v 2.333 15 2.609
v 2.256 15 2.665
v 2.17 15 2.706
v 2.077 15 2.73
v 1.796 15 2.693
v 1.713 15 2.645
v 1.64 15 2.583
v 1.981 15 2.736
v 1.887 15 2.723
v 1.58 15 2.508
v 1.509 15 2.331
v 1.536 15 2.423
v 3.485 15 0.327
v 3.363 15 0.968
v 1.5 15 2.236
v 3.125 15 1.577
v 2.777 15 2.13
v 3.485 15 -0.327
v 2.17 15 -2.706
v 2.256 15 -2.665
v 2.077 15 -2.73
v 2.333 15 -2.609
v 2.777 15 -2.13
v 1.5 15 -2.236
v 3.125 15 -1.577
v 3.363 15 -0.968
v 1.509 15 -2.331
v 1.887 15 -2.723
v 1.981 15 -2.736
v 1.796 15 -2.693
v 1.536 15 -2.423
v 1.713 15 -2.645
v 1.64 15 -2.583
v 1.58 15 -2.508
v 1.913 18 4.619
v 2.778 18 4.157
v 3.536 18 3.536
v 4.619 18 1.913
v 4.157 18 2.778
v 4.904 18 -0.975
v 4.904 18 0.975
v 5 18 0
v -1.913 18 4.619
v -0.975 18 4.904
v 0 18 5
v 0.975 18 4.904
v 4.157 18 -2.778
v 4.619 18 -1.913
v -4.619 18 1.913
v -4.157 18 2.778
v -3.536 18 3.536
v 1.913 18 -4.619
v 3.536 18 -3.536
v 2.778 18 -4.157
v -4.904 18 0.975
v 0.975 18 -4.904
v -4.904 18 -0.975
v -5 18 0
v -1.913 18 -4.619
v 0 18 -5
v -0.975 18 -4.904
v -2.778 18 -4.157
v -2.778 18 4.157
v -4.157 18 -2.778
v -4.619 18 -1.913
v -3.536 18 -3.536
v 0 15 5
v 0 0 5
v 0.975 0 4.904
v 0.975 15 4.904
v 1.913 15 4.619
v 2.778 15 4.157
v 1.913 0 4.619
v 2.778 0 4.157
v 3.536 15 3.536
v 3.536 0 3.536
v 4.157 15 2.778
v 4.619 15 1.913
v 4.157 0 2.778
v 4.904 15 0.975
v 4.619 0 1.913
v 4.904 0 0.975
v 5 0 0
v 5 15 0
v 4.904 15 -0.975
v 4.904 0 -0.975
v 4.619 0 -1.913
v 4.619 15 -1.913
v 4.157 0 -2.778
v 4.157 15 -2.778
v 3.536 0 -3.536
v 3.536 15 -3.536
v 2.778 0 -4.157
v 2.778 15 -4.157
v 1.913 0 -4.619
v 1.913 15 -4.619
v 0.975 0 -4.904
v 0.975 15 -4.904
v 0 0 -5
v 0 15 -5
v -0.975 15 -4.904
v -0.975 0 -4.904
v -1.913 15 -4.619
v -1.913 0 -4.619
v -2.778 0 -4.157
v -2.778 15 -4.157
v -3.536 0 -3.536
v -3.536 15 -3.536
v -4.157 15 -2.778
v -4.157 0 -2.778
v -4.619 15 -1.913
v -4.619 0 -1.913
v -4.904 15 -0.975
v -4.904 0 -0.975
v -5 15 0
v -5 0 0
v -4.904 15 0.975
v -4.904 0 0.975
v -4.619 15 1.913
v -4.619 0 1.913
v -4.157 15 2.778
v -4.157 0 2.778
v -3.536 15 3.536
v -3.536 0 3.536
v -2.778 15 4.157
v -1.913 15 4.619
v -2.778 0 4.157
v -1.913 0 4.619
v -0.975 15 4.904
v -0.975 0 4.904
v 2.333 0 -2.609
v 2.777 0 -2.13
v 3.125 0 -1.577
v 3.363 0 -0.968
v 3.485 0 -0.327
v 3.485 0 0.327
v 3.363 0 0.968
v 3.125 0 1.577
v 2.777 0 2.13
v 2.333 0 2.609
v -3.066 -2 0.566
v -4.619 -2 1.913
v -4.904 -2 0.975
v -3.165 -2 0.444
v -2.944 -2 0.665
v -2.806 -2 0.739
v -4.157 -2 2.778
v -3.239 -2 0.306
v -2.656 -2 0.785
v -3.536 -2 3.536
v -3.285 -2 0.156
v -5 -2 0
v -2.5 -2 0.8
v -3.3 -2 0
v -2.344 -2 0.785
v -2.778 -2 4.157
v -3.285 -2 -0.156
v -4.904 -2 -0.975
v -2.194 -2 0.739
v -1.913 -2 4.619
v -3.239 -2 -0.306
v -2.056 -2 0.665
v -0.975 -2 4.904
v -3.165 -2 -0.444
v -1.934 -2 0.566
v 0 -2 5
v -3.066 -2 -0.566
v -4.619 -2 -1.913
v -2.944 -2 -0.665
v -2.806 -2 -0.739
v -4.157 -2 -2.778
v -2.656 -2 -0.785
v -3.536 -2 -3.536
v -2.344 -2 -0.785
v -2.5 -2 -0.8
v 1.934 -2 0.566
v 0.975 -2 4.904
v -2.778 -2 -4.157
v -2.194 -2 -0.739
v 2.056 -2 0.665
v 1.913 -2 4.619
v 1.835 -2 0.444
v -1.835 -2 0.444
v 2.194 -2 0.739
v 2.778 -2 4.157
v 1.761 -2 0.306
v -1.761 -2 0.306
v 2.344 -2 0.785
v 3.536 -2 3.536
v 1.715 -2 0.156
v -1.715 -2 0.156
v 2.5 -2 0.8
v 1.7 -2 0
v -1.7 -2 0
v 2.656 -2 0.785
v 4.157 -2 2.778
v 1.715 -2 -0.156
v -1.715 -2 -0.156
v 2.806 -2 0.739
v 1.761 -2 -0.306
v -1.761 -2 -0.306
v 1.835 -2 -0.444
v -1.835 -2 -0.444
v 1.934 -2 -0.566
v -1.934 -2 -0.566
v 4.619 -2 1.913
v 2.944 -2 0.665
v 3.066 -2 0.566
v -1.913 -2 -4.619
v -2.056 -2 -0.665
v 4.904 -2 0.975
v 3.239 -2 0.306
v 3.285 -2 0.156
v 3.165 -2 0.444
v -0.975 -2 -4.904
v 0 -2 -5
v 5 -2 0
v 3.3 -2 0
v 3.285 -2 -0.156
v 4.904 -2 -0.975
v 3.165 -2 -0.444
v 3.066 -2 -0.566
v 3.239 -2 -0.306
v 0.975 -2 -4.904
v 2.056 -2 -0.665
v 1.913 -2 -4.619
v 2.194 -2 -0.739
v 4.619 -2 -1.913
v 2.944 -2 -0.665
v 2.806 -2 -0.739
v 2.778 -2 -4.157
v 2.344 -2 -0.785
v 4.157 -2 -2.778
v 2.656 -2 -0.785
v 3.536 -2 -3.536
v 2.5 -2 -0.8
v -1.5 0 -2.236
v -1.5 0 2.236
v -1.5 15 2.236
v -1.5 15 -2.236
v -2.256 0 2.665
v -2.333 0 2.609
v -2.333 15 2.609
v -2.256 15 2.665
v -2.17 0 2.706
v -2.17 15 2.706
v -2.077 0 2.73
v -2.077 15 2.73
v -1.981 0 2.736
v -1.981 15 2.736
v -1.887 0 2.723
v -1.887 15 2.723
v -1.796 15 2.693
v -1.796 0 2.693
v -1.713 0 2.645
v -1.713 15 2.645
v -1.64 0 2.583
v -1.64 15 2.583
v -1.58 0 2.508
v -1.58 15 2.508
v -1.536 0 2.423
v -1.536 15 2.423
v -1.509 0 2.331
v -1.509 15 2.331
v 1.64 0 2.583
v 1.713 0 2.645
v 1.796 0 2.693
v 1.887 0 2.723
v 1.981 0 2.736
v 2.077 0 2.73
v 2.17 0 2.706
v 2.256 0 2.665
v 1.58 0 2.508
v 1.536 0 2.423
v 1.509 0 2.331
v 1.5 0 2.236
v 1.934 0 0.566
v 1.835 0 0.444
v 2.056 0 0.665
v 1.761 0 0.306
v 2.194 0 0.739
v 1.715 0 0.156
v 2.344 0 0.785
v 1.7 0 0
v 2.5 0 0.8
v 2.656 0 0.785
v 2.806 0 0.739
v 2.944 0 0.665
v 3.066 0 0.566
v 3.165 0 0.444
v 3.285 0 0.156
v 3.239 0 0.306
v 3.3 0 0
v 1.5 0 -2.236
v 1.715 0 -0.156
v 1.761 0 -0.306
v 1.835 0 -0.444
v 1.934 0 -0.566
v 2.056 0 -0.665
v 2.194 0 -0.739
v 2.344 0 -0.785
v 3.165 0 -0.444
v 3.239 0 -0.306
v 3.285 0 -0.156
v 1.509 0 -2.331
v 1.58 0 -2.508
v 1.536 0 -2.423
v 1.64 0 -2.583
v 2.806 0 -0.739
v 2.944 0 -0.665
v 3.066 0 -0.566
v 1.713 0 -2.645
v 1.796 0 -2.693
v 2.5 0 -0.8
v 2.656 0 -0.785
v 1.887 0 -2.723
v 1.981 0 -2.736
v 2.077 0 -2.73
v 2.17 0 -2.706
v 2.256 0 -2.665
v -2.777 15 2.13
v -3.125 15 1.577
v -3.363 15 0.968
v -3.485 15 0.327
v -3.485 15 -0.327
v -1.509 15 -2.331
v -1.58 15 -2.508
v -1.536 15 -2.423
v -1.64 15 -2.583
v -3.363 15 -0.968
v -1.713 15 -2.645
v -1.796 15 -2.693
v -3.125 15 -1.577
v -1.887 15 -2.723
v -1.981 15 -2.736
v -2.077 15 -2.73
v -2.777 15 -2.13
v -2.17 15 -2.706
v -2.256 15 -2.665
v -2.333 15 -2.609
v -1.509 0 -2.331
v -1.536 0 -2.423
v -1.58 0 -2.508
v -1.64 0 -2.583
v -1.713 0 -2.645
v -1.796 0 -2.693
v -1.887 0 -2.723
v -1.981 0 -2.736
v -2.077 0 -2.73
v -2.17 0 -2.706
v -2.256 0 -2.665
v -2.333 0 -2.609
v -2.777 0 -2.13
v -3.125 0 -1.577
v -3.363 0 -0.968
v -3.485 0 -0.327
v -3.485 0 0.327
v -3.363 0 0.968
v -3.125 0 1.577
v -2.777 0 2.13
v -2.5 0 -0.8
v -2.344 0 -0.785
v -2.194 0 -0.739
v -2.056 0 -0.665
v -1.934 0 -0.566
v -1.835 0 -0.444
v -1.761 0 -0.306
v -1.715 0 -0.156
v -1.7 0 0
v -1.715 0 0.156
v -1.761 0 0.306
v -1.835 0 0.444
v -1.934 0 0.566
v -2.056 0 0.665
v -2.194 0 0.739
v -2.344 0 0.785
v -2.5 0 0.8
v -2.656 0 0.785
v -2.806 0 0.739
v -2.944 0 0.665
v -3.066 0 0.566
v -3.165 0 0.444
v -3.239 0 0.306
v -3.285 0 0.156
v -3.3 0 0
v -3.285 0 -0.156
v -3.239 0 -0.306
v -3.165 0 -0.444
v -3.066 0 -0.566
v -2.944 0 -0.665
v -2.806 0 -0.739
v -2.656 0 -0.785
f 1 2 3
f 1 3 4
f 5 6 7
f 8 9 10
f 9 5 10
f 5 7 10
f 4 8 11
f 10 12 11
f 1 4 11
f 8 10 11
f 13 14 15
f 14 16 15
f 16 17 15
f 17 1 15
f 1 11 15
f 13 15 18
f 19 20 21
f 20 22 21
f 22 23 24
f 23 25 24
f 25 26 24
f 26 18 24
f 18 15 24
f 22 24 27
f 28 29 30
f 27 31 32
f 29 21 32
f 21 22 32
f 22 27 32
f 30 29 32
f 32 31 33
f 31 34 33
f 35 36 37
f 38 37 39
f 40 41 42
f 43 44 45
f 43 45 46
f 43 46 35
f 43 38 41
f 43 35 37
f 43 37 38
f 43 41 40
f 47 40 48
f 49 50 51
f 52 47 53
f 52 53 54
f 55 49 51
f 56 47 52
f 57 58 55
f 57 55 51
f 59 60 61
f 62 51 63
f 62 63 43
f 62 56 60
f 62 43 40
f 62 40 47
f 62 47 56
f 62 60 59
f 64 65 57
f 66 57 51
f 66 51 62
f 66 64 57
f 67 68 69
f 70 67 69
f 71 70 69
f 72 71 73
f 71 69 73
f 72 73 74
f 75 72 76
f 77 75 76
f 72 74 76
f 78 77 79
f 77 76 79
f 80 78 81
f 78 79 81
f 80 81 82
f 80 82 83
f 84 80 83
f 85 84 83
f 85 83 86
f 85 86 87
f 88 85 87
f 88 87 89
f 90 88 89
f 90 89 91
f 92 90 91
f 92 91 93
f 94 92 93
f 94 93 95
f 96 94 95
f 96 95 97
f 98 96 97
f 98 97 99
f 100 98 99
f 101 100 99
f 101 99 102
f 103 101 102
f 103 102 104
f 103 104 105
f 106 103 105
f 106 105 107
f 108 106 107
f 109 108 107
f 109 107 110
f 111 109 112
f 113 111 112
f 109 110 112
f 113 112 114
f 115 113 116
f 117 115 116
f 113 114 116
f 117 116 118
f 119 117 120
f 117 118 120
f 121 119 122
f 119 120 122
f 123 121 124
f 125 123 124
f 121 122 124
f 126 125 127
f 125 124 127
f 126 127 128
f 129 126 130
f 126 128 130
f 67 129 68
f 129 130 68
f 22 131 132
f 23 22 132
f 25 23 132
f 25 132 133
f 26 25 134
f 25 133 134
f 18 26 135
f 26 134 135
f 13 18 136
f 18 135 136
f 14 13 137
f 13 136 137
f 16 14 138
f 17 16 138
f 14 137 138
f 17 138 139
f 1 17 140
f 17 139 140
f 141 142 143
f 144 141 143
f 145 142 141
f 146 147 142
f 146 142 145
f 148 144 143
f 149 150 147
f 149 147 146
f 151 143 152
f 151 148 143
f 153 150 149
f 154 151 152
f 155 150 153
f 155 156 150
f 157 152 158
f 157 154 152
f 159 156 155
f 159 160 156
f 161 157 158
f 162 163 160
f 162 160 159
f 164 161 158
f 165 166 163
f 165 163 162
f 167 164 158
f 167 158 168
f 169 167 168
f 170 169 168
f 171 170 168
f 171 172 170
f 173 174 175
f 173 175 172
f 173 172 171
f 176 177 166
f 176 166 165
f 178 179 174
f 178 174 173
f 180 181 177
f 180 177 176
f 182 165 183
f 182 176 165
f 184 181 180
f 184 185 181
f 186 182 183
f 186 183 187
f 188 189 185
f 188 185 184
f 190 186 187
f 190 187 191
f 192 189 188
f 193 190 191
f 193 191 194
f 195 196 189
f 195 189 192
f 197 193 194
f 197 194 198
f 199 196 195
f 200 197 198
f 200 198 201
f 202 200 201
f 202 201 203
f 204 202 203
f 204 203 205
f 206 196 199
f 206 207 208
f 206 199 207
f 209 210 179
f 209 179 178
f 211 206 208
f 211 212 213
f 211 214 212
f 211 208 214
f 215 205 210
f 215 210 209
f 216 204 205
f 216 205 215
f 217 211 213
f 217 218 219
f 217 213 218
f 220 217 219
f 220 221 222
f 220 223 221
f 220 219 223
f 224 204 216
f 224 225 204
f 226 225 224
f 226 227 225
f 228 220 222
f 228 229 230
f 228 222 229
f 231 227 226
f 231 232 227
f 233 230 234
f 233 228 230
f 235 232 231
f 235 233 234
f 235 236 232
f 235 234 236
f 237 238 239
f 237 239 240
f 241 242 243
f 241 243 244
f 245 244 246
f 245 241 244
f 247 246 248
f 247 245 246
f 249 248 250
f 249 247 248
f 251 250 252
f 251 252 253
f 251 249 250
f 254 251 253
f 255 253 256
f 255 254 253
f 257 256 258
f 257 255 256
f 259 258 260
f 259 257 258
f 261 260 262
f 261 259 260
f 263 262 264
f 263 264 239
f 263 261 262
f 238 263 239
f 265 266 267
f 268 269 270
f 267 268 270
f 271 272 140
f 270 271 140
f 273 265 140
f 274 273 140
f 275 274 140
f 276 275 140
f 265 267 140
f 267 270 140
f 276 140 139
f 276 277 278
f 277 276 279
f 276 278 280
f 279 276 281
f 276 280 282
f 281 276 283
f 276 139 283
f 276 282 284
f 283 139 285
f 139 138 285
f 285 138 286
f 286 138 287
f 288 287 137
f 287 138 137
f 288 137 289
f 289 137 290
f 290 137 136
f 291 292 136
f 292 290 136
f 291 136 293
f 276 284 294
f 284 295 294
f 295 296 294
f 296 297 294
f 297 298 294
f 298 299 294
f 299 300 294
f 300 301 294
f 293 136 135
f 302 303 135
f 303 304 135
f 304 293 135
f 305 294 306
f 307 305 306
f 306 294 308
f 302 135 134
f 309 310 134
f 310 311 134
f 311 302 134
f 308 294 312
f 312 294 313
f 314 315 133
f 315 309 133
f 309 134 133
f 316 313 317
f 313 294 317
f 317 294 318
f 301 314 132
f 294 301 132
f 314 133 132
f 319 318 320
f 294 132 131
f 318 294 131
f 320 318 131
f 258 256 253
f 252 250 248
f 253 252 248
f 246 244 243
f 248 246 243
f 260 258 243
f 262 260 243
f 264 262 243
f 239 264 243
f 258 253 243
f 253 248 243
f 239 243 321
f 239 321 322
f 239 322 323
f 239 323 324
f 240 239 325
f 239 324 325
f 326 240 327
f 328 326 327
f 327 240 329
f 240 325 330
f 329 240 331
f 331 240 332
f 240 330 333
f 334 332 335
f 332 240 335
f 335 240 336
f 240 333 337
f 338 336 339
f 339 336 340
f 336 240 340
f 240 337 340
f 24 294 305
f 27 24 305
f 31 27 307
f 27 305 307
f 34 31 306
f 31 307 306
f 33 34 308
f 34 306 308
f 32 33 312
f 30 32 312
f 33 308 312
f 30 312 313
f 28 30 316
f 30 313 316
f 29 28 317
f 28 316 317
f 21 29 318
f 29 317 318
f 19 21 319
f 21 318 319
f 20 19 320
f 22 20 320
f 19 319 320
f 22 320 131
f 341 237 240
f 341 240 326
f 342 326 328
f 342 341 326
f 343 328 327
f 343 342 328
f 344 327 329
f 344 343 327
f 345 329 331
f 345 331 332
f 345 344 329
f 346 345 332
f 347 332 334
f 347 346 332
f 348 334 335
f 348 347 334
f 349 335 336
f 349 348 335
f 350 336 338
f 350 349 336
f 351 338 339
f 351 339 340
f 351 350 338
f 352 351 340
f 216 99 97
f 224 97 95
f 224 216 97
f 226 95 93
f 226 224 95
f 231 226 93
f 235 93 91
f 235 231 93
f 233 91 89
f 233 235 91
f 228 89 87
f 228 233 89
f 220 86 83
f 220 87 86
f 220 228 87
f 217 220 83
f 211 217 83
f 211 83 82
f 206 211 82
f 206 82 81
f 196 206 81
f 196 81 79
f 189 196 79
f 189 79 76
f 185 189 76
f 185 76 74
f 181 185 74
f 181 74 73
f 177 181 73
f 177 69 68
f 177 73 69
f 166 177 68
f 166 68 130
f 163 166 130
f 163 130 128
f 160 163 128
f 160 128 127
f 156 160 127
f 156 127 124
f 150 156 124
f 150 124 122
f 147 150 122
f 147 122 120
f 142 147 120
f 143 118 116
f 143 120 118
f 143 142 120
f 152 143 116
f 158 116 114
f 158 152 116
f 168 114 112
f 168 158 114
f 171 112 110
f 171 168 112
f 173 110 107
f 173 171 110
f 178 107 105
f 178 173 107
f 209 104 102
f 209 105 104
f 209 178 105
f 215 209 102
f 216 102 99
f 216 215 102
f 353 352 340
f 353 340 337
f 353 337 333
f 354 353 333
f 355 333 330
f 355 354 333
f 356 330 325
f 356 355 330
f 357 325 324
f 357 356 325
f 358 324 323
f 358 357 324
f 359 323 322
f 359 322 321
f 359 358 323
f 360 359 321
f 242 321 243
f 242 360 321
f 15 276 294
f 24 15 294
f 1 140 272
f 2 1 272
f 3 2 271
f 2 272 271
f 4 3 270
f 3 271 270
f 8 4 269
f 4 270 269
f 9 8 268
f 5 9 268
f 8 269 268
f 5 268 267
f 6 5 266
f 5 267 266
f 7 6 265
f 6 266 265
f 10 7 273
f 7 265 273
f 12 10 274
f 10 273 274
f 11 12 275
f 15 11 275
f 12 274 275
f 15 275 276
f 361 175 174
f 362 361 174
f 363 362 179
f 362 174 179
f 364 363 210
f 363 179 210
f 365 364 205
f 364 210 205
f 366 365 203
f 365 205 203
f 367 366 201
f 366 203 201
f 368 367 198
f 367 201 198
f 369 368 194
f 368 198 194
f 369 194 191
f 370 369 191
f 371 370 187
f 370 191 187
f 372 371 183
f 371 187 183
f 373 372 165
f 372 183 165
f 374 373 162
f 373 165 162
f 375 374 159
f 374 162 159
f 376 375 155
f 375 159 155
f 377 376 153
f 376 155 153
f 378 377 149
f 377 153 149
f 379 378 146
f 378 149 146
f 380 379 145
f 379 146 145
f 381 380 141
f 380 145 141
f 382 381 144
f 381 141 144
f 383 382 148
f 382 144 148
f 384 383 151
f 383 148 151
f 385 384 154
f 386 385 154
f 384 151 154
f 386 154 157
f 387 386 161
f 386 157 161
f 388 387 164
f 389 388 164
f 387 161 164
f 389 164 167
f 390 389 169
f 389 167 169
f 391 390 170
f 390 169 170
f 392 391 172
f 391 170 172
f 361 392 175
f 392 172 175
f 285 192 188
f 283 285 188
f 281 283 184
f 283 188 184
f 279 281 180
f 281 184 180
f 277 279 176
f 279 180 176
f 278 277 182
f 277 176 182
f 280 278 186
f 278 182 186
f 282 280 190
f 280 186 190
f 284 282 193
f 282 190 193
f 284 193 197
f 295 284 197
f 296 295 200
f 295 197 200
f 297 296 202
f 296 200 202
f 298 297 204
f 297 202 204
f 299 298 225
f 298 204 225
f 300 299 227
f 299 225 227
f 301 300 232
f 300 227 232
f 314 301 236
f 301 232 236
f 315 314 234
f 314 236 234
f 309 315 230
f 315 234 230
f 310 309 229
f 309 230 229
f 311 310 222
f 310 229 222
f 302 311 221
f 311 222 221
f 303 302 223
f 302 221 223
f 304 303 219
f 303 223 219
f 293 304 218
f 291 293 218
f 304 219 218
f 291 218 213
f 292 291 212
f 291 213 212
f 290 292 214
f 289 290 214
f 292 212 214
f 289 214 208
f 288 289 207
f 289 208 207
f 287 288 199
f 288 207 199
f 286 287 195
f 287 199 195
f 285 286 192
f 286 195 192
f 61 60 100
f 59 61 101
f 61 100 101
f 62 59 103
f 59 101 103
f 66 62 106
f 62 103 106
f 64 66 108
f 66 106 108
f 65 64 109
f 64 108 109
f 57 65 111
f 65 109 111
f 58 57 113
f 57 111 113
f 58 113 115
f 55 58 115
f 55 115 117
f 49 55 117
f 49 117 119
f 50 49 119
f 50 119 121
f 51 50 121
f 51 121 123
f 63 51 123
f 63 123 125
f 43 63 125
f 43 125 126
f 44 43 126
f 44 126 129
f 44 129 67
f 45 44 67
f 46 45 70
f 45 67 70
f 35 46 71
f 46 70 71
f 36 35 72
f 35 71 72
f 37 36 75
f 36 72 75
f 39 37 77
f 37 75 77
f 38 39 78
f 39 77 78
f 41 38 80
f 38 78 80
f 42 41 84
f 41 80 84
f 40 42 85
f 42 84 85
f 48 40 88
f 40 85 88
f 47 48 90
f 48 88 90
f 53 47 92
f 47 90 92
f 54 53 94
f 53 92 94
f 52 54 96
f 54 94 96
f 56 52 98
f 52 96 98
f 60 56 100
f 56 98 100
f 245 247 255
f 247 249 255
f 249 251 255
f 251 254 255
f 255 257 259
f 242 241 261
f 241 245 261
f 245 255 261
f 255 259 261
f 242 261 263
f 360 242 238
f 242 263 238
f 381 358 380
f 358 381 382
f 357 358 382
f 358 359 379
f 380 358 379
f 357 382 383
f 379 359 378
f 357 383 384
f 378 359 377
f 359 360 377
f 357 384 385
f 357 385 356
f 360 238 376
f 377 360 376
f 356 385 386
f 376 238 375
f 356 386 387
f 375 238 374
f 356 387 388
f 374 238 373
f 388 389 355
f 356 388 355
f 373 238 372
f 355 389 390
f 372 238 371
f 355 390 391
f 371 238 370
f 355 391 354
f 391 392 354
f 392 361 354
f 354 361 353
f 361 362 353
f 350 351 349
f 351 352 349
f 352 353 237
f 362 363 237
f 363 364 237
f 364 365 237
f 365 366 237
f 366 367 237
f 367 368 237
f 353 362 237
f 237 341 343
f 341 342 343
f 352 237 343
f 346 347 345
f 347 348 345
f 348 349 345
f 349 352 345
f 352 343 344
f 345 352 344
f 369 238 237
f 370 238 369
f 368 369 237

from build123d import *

# Parameters (mm, degrees)
SKETCH1_R           = 5
BOSS_EXTRUDE1_DEPTH = 15
BOSS_EXTRUDE2_START = 2
SKETCH2_R           = 5
SKETCH2_R_2         = 0.8
BOSS_EXTRUDE2_DEPTH = 2
SKETCH3_R           = 5
BOSS_EXTRUDE3_DEPTH = 3


with BuildPart() as part:
    # Sketch1 → Boss-Extrude1 (new body)
    with BuildSketch(Plane(origin=(0, 0, 0), x_dir=(1, 0, 0), z_dir=(0, 1, 0))):
        with Locations(Location((0, 0, 0), (0, 0, 270))):
            Circle(SKETCH1_R)
        with BuildLine():
            Line((1.5, -2.236067977), (1.5, 2.236067977))
            ThreePointArc((1.5, 2.236067977), (1.795875855, 2.692503442), (2.333333333, 2.608745974))
            ThreePointArc((2.333333333, 2.608745974), (3.5, 0), (2.333333333, -2.608745974))
            ThreePointArc((2.333333333, -2.608745974), (1.795875855, -2.692503442), (1.5, -2.236067977))
        make_face(mode=Mode.SUBTRACT)
        with BuildLine():
            Line((-1.5, -2.236067977), (-1.5, 2.236067977))
            ThreePointArc((-1.5, 2.236067977), (-1.795875855, 2.692503442), (-2.333333333, 2.608745974))
            ThreePointArc((-2.333333333, 2.608745974), (-3.5, 0), (-2.333333333, -2.608745974))
            ThreePointArc((-2.333333333, -2.608745974), (-1.795875855, -2.692503442), (-1.5, -2.236067977))
        make_face(mode=Mode.SUBTRACT)
    extrude(amount=BOSS_EXTRUDE1_DEPTH)

    # Sketch2 → Boss-Extrude2 (add)
    with BuildSketch(Plane.XZ.offset(BOSS_EXTRUDE2_START)):
        with Locations(Location((0, 0, 0), (0, 0, 270))):
            Circle(SKETCH2_R)
        with Locations(Location((-2.5, 0, 0), (0, 0, 270))):
            Circle(SKETCH2_R_2, mode=Mode.SUBTRACT)
        with Locations(Location((2.5, 0, 0), (0, 0, 90))):
            Circle(SKETCH2_R_2, mode=Mode.SUBTRACT)
    extrude(amount=-BOSS_EXTRUDE2_DEPTH)

    # Sketch3 → Boss-Extrude3 (add)
    with BuildSketch(Plane(origin=(0, 15, 0), x_dir=(1, 0, 0), z_dir=(0, 1, 0))):
        with Locations(Location((0, 0, 0), (0, 0, 90))):
            Circle(SKETCH3_R)
    extrude(amount=BOSS_EXTRUDE3_DEPTH)


solid = part.part
